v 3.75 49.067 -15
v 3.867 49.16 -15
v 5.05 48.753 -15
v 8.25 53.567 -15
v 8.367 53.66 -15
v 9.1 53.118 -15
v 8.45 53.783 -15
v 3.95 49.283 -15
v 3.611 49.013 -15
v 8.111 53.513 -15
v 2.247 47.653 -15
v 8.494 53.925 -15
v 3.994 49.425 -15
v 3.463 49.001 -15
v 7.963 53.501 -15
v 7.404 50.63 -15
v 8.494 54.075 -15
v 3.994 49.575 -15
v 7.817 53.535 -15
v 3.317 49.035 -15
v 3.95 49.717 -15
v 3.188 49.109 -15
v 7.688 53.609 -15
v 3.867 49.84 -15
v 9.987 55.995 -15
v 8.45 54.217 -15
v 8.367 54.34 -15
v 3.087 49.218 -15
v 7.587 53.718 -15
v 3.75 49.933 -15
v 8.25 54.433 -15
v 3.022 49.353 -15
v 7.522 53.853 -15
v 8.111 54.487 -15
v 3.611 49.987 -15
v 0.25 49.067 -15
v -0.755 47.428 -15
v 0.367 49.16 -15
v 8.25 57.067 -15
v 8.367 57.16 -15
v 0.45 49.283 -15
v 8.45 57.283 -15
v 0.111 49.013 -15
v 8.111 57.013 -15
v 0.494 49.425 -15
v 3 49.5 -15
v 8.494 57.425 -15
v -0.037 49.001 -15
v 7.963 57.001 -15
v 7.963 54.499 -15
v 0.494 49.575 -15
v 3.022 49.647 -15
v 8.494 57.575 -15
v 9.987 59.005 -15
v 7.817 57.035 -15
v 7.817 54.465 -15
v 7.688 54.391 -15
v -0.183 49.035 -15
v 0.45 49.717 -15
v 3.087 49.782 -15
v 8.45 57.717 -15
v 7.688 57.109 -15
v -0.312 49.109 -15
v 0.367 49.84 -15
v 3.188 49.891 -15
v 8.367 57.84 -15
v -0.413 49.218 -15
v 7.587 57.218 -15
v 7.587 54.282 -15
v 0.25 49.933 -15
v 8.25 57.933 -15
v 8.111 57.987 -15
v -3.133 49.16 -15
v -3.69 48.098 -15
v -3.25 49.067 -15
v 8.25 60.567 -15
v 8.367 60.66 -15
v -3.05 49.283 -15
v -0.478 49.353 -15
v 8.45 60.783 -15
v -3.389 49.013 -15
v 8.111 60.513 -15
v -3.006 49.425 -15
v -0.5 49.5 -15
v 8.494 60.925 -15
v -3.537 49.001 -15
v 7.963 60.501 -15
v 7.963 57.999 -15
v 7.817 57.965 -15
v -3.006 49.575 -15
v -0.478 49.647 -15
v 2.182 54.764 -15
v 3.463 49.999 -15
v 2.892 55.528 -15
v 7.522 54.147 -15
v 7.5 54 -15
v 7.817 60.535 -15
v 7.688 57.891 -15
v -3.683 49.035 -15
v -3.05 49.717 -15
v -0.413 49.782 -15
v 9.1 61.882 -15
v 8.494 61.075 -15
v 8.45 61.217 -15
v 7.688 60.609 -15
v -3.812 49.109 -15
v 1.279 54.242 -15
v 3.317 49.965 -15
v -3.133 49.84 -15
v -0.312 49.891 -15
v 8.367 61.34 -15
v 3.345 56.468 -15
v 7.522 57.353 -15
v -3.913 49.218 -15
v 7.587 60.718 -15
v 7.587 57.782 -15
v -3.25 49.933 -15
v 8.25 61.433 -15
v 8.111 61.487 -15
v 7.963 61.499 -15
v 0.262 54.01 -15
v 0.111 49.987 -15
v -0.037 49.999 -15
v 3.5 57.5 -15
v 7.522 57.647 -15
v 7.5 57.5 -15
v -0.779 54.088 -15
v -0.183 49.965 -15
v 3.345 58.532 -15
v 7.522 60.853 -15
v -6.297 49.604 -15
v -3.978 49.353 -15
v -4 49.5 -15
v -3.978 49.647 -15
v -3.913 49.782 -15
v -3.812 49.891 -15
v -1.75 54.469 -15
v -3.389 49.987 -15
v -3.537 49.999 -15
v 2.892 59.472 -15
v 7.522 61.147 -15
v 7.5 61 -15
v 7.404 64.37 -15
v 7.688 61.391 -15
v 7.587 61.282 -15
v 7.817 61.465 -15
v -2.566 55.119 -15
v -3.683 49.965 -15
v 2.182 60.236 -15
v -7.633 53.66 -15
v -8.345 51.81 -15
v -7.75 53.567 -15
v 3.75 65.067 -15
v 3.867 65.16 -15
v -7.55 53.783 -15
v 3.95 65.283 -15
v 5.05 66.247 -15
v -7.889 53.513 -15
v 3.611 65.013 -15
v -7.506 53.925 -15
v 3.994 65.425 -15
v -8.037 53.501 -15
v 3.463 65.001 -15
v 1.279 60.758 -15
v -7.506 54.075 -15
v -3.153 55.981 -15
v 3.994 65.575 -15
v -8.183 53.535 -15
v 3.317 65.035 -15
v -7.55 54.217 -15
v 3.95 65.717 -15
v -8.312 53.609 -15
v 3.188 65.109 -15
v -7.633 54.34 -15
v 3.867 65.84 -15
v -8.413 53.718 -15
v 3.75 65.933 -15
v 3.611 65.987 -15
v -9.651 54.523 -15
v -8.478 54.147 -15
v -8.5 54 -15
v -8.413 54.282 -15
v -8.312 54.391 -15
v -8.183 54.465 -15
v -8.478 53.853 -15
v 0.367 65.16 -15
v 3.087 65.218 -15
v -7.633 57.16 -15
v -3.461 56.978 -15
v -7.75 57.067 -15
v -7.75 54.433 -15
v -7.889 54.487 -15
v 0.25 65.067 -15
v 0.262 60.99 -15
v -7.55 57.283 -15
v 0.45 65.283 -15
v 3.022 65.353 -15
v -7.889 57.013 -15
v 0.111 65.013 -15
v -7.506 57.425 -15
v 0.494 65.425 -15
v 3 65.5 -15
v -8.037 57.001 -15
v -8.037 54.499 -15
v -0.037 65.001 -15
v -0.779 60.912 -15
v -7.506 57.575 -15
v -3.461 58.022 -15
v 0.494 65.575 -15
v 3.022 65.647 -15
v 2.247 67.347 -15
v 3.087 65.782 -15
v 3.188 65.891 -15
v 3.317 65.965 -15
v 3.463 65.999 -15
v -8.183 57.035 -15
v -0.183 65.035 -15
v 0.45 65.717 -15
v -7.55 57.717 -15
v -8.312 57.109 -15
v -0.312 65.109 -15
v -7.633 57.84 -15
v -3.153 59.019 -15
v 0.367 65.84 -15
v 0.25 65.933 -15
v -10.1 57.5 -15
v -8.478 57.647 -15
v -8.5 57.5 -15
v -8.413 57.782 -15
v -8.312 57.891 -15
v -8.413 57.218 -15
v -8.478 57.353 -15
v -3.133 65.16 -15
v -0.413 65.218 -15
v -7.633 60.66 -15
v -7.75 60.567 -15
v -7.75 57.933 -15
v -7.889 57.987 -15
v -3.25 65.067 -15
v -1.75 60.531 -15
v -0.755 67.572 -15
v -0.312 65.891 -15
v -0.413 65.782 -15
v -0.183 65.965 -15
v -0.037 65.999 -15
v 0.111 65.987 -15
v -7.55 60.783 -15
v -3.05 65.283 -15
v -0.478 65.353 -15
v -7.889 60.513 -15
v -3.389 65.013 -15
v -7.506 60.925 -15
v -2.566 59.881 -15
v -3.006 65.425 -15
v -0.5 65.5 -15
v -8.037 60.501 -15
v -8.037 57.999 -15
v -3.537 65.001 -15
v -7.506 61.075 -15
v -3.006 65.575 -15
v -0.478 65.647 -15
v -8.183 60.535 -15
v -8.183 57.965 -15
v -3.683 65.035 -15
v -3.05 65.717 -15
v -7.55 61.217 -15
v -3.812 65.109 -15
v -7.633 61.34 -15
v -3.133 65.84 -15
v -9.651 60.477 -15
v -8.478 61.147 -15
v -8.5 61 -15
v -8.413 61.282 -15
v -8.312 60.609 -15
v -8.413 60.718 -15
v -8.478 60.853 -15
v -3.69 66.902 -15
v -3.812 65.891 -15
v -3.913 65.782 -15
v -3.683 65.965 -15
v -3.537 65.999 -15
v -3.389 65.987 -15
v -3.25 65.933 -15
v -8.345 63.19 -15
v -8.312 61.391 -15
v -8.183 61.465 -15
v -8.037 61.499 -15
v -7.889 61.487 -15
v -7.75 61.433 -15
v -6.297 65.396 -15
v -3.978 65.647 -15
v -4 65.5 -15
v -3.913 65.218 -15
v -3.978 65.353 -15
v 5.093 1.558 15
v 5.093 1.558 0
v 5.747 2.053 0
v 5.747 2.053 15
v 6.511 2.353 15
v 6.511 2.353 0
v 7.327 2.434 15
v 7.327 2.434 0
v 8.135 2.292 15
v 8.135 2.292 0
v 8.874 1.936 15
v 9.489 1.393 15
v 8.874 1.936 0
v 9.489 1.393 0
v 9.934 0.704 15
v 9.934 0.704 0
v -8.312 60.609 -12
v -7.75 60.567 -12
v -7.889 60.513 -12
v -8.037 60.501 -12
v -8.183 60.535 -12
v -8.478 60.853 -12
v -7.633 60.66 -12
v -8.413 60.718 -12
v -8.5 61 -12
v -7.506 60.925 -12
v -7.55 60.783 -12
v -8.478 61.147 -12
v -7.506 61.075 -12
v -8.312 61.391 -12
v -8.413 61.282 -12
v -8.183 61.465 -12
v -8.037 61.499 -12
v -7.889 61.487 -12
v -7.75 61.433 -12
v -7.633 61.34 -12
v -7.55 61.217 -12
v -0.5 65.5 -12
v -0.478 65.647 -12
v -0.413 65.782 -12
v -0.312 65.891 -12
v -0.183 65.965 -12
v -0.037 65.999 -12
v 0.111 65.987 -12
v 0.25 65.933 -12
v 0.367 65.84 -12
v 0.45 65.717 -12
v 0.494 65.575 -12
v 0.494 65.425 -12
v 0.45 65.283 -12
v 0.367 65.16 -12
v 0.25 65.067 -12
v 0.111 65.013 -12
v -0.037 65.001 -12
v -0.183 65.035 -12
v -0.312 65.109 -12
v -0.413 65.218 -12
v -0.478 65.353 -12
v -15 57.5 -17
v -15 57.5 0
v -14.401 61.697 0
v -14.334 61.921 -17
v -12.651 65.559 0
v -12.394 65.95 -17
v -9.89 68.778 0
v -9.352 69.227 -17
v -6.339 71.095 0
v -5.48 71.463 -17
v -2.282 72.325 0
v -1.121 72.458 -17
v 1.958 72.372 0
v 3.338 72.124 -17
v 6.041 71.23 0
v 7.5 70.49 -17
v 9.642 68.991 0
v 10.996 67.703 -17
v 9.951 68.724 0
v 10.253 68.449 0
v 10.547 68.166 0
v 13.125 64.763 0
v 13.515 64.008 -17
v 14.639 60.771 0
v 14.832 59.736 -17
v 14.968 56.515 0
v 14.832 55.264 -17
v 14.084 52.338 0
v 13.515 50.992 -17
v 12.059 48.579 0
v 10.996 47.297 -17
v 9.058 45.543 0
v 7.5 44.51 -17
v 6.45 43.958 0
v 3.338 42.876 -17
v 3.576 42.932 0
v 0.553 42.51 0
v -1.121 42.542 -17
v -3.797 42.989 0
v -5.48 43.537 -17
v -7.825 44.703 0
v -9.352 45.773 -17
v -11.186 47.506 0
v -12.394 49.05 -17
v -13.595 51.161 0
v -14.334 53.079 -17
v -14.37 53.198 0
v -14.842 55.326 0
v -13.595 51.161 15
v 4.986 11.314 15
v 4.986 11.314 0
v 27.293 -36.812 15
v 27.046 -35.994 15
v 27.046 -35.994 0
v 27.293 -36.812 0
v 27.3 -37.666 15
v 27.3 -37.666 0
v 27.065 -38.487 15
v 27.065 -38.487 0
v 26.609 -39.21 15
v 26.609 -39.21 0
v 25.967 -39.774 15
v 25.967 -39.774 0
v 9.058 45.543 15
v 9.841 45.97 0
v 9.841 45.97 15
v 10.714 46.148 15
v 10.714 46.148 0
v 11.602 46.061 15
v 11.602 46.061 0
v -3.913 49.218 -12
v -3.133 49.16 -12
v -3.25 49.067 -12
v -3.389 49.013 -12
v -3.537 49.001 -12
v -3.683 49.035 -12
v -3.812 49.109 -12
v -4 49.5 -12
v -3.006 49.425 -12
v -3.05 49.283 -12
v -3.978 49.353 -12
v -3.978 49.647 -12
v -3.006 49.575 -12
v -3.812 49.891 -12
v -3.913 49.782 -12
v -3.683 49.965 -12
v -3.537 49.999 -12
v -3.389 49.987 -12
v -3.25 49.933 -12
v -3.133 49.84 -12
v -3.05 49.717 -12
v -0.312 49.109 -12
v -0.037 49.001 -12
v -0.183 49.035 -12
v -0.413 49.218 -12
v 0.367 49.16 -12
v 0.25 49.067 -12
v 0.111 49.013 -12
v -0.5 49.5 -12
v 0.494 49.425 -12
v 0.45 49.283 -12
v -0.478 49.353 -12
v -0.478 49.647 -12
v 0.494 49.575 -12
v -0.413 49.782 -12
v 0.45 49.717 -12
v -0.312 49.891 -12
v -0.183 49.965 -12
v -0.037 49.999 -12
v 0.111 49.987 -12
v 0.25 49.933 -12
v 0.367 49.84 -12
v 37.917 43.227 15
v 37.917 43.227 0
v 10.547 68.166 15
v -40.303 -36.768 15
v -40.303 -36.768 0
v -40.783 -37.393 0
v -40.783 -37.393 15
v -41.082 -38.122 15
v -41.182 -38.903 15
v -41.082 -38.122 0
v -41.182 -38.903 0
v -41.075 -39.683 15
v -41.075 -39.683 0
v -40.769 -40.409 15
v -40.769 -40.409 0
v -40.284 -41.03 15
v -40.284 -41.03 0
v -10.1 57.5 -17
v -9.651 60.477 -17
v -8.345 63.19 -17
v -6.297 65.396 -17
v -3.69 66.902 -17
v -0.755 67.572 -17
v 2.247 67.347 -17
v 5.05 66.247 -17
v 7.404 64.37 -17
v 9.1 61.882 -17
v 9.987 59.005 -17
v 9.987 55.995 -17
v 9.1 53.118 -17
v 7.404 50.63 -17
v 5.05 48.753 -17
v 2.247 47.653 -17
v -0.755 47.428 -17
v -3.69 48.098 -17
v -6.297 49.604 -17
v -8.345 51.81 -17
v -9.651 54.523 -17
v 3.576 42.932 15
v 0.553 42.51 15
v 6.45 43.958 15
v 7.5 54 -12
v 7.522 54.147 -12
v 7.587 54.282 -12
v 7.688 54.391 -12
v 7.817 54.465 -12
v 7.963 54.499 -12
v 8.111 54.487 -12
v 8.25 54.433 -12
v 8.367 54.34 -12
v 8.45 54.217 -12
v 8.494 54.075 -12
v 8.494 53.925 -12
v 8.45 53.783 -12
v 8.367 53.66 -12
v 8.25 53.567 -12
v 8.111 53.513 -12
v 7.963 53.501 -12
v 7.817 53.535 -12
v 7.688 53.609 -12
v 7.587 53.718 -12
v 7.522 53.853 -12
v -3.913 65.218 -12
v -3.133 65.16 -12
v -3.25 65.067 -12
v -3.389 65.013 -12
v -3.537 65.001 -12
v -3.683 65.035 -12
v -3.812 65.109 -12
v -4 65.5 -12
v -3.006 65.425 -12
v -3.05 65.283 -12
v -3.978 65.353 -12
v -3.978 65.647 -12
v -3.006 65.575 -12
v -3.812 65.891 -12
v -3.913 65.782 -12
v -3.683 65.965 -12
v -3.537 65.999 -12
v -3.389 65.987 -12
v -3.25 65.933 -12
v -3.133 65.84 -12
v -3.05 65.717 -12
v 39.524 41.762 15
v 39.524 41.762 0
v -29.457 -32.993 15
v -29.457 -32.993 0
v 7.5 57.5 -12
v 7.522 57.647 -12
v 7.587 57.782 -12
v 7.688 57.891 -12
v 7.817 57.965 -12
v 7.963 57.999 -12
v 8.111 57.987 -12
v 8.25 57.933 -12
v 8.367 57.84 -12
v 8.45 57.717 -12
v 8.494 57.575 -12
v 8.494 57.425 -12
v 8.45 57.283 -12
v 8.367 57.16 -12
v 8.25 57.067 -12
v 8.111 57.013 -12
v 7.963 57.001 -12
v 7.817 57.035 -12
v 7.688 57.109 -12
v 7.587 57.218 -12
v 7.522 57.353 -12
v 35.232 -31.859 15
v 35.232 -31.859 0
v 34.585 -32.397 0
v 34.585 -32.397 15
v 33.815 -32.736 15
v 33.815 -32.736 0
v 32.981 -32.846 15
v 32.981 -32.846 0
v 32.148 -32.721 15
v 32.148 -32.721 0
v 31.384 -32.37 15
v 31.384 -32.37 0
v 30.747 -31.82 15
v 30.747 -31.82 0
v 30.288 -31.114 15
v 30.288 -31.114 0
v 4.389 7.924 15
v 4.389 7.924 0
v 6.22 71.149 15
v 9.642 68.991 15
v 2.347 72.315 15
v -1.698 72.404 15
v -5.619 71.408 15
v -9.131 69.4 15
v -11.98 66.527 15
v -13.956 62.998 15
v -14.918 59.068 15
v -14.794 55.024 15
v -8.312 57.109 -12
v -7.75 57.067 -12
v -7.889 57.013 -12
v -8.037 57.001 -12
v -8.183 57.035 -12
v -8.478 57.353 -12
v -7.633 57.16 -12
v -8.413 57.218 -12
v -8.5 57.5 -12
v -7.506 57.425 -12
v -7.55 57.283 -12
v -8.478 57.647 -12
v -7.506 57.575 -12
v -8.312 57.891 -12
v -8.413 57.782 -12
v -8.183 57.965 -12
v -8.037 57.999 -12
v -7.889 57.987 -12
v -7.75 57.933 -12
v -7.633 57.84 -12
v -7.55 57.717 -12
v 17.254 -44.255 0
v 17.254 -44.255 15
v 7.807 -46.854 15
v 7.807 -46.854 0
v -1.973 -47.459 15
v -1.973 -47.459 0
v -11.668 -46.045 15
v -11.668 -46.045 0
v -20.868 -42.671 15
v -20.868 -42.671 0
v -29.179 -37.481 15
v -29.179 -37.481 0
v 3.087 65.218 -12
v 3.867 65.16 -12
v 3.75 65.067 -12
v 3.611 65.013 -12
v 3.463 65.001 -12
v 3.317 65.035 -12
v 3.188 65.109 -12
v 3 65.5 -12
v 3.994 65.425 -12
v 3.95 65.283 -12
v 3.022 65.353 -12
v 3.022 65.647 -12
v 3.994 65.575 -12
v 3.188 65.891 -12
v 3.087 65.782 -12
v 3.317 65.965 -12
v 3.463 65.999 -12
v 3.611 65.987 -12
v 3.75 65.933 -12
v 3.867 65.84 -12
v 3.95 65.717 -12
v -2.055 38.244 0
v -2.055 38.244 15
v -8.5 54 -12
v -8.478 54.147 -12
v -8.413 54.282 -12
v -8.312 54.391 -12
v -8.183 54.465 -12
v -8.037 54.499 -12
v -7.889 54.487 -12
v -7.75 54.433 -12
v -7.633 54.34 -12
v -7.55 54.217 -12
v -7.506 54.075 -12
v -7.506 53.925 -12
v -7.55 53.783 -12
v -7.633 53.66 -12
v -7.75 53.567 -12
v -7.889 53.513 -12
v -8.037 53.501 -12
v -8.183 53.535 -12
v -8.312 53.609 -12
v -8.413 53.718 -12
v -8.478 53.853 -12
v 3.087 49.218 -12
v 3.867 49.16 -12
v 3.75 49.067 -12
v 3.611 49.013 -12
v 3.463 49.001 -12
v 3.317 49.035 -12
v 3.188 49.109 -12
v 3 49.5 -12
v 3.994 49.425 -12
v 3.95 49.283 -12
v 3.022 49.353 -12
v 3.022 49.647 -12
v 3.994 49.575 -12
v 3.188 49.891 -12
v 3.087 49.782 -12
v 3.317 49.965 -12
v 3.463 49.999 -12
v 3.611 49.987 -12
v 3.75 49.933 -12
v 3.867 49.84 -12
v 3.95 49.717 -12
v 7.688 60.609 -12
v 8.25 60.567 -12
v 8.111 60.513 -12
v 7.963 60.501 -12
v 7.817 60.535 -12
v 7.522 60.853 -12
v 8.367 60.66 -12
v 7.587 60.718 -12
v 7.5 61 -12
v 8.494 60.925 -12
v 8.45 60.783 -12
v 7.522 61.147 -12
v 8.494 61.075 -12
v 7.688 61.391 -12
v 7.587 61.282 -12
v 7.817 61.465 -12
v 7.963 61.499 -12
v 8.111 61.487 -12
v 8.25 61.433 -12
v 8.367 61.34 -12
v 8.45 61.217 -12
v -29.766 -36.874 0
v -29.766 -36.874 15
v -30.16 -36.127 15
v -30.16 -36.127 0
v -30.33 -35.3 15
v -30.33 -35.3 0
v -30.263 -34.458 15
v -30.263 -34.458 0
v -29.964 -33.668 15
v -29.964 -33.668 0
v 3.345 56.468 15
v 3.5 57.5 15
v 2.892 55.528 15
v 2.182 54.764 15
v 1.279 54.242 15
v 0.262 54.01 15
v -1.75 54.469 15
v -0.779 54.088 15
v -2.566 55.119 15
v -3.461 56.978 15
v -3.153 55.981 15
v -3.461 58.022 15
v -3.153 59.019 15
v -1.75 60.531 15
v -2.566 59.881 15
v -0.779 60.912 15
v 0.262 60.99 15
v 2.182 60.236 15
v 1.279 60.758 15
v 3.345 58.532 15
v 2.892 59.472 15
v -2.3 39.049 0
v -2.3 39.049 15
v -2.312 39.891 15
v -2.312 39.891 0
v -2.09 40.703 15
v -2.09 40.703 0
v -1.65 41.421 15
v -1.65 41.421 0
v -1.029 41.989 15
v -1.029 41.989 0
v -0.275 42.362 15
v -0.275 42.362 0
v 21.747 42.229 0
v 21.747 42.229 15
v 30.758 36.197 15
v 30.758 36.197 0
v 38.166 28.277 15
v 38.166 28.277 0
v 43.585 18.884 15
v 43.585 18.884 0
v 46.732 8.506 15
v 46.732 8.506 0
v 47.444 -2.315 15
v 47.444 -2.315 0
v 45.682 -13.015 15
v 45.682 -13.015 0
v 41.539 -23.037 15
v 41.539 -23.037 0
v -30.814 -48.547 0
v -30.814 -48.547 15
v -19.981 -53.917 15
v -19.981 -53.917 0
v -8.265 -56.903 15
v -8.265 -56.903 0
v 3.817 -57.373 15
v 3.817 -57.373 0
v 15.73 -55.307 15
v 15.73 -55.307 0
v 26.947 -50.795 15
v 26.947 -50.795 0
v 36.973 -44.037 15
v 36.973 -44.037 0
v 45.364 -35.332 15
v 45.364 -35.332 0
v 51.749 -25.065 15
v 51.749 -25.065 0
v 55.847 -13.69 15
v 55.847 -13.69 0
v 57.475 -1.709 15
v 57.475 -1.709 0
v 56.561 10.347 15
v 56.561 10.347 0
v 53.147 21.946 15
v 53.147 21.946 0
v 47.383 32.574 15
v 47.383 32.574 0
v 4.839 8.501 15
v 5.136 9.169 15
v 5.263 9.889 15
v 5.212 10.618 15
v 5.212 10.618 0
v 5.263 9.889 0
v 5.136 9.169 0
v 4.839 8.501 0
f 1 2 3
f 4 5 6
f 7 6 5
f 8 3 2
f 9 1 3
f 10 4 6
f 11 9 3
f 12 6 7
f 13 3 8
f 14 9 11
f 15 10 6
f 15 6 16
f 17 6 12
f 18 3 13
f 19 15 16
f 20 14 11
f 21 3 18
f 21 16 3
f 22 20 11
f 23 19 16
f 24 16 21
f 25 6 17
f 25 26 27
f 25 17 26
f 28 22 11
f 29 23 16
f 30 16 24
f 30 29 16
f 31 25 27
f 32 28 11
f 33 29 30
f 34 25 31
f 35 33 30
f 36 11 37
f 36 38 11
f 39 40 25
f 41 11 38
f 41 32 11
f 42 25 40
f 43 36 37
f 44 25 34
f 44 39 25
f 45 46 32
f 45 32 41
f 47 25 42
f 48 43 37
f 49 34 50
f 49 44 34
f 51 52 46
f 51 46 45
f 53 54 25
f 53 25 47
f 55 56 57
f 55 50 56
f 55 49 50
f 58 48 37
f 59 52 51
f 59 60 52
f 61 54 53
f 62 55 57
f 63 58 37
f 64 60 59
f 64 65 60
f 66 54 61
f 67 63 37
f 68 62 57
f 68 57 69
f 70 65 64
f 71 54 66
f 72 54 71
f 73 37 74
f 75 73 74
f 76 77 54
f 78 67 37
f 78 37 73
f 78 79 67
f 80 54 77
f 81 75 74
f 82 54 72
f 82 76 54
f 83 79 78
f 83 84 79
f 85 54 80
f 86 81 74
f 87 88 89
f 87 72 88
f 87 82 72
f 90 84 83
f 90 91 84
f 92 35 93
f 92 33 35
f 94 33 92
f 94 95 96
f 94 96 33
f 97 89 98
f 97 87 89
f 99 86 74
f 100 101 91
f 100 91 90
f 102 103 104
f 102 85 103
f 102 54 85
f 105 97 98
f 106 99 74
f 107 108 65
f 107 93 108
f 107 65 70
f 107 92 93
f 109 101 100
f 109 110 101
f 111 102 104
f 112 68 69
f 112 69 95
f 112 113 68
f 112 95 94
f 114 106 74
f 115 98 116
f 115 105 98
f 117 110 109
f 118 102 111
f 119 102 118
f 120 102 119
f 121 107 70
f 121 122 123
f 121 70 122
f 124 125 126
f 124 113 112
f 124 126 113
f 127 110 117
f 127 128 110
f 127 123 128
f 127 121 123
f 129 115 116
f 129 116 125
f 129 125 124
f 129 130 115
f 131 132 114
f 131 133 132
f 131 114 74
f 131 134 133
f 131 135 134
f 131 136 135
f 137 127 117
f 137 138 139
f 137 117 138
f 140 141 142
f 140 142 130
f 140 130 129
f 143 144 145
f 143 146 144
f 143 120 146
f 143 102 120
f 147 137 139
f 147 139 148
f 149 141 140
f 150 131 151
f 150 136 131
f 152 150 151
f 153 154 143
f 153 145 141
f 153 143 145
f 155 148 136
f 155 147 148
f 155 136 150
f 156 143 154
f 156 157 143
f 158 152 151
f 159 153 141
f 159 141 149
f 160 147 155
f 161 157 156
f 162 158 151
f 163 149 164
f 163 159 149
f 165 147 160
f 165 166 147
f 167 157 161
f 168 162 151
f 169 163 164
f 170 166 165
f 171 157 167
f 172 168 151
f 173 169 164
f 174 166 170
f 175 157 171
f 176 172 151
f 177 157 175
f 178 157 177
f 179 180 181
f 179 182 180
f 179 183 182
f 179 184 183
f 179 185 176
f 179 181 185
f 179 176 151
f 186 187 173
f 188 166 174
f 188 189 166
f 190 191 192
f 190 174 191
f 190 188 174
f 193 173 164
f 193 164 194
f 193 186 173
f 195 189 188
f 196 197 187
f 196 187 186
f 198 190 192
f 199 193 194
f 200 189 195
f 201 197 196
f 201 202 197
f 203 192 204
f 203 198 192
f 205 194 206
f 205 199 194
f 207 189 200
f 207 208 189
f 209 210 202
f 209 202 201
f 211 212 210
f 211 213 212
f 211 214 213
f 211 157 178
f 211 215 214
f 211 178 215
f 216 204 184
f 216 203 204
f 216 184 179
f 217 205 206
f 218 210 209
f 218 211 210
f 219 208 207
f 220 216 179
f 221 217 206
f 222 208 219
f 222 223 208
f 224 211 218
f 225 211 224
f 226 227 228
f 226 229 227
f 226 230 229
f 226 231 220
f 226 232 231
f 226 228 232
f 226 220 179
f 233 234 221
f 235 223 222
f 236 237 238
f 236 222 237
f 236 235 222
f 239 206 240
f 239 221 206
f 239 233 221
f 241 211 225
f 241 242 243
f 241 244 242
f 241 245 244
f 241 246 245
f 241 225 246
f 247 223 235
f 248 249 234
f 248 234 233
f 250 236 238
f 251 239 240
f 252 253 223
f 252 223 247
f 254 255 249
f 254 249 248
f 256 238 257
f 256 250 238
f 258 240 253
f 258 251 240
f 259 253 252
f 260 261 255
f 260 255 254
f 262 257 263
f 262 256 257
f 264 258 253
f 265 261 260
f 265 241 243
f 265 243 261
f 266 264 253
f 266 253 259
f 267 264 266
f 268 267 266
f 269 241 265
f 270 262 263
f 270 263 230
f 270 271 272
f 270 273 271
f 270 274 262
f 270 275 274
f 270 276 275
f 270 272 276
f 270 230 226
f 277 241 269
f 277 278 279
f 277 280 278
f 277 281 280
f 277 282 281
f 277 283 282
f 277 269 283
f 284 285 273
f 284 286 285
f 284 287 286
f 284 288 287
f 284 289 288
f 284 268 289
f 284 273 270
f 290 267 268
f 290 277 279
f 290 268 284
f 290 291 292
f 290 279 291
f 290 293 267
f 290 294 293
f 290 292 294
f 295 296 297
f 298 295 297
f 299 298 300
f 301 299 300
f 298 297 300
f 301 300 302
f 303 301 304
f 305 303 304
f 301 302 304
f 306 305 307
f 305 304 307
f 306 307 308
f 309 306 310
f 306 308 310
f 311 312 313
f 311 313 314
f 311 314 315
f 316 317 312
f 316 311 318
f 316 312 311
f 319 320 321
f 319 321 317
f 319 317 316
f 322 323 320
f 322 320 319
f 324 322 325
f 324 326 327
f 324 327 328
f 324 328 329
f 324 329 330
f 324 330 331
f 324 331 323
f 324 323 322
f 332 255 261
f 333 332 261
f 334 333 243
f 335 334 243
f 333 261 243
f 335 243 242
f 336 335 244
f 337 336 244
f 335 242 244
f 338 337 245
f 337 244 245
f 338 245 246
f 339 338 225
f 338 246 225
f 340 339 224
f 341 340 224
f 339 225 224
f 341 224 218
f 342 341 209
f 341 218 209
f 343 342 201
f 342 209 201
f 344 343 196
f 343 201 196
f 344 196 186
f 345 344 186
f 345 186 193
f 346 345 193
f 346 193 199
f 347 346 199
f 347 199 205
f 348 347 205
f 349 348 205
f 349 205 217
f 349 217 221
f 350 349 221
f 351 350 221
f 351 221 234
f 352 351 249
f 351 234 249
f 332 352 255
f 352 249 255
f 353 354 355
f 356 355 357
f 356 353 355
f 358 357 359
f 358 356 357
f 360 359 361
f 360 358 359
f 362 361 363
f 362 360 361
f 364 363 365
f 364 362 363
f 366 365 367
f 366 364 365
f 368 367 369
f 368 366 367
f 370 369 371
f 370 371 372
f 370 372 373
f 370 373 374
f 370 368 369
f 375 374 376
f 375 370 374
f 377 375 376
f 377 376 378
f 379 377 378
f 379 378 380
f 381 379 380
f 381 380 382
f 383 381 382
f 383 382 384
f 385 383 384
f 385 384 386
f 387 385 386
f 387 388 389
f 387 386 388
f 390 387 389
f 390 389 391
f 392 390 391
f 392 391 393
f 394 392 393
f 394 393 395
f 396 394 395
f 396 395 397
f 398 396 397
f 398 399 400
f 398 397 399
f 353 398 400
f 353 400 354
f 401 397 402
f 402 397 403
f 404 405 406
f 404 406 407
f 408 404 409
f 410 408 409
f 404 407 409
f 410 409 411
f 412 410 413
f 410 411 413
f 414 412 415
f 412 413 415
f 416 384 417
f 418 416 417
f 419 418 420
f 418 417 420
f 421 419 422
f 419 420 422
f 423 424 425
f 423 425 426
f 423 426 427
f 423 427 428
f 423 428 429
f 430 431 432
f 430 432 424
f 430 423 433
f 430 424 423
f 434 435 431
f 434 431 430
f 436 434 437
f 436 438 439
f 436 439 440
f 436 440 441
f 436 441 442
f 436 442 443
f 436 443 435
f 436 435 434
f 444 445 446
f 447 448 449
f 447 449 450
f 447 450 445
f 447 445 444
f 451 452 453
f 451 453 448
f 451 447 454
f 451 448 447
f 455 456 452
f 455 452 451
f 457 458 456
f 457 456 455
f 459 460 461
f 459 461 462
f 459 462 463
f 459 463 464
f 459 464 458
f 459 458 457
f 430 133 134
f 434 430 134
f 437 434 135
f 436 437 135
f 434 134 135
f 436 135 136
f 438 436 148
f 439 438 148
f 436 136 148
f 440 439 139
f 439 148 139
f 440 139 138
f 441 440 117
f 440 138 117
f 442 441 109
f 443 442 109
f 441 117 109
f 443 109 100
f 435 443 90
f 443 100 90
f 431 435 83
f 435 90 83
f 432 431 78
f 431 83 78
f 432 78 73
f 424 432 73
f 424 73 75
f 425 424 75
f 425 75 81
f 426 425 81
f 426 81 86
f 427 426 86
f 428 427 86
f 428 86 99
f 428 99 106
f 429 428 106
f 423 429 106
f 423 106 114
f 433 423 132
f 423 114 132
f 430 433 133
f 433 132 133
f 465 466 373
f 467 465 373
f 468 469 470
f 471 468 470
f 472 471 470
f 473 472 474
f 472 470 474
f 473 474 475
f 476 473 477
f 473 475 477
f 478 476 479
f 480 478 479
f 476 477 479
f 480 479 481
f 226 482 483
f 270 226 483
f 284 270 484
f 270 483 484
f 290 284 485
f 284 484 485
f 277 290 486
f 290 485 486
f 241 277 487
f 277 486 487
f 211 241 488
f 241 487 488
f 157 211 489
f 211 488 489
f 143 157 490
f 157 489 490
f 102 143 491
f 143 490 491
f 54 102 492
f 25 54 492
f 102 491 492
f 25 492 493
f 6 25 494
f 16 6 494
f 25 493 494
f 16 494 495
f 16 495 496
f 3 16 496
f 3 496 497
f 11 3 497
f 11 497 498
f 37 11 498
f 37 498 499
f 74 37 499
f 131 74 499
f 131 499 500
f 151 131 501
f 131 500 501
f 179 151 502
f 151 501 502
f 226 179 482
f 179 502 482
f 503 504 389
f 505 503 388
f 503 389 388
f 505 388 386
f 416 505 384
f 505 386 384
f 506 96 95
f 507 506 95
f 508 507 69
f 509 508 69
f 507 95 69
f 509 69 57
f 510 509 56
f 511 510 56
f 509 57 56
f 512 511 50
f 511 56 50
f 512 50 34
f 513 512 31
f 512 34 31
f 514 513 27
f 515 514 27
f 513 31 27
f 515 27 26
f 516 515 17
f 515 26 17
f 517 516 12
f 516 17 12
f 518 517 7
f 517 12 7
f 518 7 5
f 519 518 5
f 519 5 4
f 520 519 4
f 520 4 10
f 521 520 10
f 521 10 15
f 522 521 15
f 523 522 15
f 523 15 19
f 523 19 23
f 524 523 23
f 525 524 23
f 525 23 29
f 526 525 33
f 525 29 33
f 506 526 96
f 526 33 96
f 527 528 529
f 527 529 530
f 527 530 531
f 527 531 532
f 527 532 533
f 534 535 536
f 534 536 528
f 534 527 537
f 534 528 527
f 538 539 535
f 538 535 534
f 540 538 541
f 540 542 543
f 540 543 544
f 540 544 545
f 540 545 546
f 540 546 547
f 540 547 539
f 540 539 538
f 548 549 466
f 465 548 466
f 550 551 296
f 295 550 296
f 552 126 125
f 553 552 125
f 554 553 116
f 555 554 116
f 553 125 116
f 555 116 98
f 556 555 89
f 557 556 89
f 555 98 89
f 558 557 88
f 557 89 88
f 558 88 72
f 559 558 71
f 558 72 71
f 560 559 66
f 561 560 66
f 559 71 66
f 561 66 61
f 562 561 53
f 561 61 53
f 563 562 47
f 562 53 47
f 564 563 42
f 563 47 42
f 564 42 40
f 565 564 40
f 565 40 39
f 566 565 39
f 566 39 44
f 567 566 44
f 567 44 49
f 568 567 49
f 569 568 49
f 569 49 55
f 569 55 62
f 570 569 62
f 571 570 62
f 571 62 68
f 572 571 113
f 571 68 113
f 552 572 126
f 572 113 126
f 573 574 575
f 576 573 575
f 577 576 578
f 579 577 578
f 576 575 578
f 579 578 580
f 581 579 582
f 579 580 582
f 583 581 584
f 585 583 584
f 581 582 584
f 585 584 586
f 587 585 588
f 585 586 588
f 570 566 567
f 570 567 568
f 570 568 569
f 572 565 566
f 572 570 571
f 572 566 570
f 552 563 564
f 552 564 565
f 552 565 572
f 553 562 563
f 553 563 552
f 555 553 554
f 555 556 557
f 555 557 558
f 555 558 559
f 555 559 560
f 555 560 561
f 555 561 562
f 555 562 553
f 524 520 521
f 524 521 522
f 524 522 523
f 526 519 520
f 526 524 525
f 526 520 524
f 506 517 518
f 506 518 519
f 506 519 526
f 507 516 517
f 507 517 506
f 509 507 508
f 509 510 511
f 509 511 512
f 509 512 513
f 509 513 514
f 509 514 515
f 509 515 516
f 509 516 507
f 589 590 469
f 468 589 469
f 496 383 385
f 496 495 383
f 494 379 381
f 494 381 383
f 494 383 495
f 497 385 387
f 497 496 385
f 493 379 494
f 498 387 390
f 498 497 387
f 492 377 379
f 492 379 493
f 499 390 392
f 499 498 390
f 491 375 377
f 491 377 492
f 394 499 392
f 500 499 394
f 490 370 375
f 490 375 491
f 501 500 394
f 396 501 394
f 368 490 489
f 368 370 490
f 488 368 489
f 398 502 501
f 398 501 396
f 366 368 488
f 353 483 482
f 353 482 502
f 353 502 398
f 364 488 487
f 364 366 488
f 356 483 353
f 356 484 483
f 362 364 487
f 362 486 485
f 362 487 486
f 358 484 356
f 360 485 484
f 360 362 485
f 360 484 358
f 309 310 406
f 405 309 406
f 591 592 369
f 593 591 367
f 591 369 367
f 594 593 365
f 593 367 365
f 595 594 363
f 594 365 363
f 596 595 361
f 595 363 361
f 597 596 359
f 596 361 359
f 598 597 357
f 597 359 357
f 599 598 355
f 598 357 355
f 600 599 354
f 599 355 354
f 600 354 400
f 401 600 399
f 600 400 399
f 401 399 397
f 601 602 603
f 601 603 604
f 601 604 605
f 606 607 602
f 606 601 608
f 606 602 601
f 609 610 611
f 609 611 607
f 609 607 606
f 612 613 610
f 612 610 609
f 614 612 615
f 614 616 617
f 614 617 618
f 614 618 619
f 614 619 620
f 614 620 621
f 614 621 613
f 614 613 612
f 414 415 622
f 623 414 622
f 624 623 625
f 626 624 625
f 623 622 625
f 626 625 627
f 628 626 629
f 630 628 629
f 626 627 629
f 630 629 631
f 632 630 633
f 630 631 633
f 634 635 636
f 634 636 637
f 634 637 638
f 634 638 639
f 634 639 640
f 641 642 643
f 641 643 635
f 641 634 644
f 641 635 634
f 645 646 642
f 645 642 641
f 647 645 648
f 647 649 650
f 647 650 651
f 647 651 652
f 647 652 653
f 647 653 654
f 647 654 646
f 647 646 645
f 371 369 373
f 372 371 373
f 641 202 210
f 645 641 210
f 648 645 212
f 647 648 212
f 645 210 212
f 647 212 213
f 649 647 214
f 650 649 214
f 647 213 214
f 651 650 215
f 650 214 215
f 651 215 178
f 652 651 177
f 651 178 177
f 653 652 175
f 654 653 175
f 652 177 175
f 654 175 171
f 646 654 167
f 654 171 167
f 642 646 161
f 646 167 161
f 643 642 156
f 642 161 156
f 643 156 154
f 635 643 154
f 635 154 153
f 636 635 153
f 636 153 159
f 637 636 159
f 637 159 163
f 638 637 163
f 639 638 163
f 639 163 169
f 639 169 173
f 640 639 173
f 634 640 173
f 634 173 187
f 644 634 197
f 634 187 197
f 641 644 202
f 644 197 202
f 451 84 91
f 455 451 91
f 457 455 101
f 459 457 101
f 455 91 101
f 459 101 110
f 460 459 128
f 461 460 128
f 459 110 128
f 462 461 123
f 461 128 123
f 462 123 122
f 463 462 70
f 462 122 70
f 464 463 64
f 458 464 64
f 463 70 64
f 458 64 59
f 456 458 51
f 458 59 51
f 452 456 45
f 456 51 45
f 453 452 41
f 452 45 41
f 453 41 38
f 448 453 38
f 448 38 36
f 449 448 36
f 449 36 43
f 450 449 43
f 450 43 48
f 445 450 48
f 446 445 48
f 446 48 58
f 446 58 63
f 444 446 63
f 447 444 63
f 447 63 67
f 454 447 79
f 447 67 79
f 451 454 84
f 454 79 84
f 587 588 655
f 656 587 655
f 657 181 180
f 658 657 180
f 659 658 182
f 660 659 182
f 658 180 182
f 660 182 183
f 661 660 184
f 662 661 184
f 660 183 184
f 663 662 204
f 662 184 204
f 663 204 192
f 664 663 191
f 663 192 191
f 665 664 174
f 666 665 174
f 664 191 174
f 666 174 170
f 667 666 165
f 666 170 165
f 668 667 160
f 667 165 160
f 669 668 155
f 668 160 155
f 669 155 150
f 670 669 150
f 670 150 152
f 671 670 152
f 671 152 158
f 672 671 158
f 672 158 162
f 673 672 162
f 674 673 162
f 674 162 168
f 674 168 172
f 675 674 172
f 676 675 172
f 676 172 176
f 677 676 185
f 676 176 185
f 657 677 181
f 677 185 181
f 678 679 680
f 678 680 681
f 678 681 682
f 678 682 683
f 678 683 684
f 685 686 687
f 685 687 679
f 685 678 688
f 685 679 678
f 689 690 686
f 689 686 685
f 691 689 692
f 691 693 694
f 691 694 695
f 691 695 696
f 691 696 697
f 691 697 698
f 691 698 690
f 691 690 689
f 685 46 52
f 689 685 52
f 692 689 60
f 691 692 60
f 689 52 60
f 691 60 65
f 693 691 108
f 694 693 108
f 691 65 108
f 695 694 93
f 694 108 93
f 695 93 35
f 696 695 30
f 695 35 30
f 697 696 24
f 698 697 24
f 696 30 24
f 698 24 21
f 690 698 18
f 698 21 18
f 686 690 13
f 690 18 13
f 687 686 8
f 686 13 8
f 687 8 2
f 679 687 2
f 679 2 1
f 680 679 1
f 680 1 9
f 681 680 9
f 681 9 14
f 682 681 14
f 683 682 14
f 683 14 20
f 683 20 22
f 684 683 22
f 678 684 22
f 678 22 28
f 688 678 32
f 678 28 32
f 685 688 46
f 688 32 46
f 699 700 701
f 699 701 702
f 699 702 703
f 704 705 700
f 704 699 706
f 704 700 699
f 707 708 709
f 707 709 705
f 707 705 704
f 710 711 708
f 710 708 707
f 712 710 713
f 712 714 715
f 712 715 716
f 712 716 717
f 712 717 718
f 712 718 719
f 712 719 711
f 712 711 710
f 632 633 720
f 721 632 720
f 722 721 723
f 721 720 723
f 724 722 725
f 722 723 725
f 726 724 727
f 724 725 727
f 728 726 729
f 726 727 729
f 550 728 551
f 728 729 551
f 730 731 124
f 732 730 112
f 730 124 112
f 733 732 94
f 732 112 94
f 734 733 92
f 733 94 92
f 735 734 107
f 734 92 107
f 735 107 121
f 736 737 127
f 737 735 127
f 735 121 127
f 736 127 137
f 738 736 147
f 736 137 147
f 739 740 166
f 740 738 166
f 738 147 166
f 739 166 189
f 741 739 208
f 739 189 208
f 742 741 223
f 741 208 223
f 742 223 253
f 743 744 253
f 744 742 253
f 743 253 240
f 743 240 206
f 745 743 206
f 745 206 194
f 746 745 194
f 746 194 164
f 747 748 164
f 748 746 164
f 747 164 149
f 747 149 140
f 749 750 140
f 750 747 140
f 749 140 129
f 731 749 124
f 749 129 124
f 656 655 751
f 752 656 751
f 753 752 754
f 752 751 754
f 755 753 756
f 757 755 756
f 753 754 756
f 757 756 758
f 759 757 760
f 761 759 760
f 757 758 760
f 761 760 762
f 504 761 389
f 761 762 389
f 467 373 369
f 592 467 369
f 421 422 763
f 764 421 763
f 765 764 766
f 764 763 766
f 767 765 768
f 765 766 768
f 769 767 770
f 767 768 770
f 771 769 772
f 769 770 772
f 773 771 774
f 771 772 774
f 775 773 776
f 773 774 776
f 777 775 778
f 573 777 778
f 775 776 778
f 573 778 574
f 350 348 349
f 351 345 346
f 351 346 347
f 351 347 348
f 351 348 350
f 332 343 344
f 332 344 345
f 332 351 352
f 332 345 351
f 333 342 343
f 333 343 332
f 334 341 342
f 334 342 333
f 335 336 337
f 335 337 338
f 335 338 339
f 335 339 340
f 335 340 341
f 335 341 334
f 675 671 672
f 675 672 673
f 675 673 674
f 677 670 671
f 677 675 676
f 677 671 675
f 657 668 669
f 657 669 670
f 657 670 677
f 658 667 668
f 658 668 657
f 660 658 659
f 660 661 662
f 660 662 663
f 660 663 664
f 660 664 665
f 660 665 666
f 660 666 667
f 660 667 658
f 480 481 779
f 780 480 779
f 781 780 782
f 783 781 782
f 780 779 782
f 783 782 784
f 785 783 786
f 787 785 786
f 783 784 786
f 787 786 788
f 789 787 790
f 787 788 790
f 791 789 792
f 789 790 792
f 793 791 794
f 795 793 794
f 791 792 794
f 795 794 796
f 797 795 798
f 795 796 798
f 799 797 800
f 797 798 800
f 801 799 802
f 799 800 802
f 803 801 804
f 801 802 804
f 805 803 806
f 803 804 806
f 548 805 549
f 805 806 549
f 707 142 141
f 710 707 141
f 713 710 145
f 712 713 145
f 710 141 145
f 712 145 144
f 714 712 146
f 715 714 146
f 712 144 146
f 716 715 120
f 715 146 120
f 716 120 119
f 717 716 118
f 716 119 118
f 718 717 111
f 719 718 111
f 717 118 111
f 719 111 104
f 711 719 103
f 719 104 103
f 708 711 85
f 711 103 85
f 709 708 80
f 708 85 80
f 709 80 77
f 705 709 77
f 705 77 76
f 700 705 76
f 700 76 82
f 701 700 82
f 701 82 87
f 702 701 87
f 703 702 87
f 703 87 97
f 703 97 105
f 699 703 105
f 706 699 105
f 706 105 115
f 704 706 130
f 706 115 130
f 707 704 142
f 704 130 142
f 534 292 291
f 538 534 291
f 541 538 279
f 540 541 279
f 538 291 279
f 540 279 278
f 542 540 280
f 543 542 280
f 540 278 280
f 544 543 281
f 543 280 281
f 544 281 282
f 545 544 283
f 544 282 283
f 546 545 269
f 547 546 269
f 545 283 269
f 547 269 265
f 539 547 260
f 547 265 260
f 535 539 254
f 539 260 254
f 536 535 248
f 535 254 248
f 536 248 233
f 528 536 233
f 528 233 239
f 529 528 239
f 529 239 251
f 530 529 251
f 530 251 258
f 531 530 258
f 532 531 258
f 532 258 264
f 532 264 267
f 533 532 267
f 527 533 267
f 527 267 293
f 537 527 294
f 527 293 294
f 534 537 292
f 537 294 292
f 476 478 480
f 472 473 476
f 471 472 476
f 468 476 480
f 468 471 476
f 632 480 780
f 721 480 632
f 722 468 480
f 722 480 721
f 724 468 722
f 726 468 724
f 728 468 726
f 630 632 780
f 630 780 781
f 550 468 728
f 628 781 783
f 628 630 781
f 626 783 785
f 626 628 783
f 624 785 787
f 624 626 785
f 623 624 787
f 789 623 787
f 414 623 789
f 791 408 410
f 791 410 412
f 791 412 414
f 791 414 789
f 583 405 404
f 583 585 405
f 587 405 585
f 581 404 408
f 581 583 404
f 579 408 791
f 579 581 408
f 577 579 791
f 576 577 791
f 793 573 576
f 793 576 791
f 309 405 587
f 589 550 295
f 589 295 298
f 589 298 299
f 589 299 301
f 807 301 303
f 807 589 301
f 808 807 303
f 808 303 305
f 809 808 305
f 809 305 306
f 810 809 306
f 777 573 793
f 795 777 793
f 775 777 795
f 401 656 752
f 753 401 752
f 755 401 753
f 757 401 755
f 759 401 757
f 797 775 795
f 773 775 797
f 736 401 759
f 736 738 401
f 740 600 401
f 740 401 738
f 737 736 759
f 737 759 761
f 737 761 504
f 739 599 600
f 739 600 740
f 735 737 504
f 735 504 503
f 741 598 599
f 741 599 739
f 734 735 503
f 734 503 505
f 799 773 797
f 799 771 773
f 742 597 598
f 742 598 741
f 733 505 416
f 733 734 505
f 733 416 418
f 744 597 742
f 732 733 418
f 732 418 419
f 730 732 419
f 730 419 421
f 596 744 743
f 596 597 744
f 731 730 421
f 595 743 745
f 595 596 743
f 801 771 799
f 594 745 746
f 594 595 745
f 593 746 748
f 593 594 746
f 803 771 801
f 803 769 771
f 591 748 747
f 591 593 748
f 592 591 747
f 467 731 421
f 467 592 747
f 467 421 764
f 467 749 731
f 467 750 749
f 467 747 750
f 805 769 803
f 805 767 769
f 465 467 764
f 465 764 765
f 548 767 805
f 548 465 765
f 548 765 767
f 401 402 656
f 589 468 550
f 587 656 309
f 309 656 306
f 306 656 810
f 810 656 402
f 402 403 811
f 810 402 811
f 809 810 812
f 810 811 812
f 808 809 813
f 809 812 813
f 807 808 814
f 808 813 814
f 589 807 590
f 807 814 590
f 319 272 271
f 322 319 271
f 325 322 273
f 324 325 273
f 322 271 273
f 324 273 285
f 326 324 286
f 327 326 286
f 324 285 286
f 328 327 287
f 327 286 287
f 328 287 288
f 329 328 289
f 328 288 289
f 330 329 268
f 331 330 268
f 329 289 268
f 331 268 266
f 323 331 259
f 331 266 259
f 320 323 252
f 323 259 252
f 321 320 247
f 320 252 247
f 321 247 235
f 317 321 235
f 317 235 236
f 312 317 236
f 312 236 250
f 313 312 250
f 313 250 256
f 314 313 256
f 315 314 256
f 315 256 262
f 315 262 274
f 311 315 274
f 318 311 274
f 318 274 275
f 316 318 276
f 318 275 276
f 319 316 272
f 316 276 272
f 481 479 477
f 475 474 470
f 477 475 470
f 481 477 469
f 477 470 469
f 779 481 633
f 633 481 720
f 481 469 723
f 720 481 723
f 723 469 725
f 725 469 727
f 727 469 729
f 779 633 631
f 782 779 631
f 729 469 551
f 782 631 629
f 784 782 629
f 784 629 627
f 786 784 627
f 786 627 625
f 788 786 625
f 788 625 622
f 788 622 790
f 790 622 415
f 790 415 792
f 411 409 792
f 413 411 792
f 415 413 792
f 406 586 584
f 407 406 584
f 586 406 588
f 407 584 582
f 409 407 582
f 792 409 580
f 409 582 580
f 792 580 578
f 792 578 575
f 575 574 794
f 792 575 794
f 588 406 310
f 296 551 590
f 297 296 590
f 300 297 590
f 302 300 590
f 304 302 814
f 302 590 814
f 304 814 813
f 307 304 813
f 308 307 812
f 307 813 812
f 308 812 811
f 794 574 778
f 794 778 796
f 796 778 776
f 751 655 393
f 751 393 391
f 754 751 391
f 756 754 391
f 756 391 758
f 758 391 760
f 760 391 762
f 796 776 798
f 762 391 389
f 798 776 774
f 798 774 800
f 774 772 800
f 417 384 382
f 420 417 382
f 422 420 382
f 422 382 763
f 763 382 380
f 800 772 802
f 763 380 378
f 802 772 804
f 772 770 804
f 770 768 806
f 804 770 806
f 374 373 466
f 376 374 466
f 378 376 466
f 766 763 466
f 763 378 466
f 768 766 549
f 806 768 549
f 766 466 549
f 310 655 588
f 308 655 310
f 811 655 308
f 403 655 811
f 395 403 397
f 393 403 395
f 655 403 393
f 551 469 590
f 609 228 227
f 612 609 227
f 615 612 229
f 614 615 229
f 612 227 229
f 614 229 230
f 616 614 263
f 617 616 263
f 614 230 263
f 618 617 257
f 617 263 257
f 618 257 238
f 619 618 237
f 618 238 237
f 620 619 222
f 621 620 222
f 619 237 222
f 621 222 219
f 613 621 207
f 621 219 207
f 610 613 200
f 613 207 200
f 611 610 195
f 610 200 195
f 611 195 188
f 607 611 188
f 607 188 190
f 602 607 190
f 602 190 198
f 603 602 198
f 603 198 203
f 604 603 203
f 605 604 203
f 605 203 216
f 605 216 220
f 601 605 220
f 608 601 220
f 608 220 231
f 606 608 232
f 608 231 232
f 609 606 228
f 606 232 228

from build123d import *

# Parameters (mm, degrees)
EXTRUDE_1_DEPTH     = 15
SKETCH_6_R          = 3.5
CUT_EXTRUDE_2_DEPTH = 15
EXTRUDE_START       = 17
SKETCH_11_R         = 15
SKETCH_11_R_2       = 3.5
EXTRUDE_3_DEPTH     = 17
SKETCH_12_R         = 10.1
CUT_EXTRUDE_6_DEPTH = 2
SKETCH_13_R         = 0.5
CUT_EXTRUDE_7_DEPTH = 3


with BuildPart() as part:
    # ｽｹｯﾁ1 → ﾎﾞｽ - 押し出し1 (new body)
    with BuildSketch(Plane.XY):
        with BuildLine():
            Line((10.546944731, 68.165925034), (9.641814145, 68.990666647))
            ThreePointArc((9.641814145, 68.990666647), (-9.131421435, 69.400300104), (-13.594616806, 51.160726074))
            Line((-13.594616806, 51.160726074), (4.986432096, 11.313538113))
            ThreePointArc((4.986432096, 11.313538113), (5.221931994, 9.524738795), (4.388829079, 7.924362985))
            Line((4.388829079, 7.924362985), (-40.303464689, -36.767930783))
            ThreePointArc((-40.303464689, -36.767930783), (-41.182112782, -38.903012739), (-40.283913759, -41.029943849))
            ThreePointArc((-40.283913759, -41.029943849), (41.397896806, -39.905690573), (39.524106652, 41.762363359))
            Line((39.524106652, 41.762363359), (37.916838192, 43.226882625))
            Line((37.916838192, 43.226882625), (10.546944731, 68.165925034))
        make_face()
        with BuildLine():
            ThreePointArc((5.093338956, 1.55780505), (7.735603832, 2.390907965), (9.933582661, 0.704339492))
            Line((9.933582661, 0.704339492), (27.046217634, -35.993824637))
            ThreePointArc((27.046217634, -35.993824637), (27.212084573, -38.085077821), (25.967336583, -39.773702754))
            ThreePointArc((25.967336583, -39.773702754), (-1.972837213, -47.459012983), (-29.17877254, -37.481318454))
            ThreePointArc((-29.17877254, -37.481318454), (-30.330146685, -35.299826939), (-29.457223039, -32.992756945))
            Line((-29.457223039, -32.992756945), (5.093338956, 1.55780505))
        make_face(mode=Mode.SUBTRACT)
        with BuildLine():
            ThreePointArc((35.231836325, -31.858557864), (32.560090836, -32.813013733), (30.287744354, -31.114293205))
            Line((30.287744354, -31.114293205), (-2.054746852, 38.244403012))
            ThreePointArc((-2.054746852, 38.244403012), (-1.895310582, 41.077194163), (0.553480425, 42.510214831))
            ThreePointArc((0.553480425, 42.510214831), (5.039223996, 43.371793408), (9.057681155, 45.543478261))
            ThreePointArc((9.057681155, 45.543478261), (10.270904088, 46.091905397), (11.601973614, 46.061309233))
            ThreePointArc((11.601973614, 46.061309233), (45.455779175, 13.784851815), (35.231836325, -31.858557864))
        make_face(mode=Mode.SUBTRACT)
    extrude(amount=EXTRUDE_1_DEPTH)

    # ｽｹｯﾁ6 → ｶｯﾄ - 押し出し2 (cut)
    with BuildSketch(Plane.XY.offset(15)):
        with Locations((0, 57.5)):
            Circle(SKETCH_6_R)
    extrude(amount=-CUT_EXTRUDE_2_DEPTH, mode=Mode.SUBTRACT)

    # ｽｹｯﾁ11 → ﾎﾞｽ - 押し出し3 (add)
    with BuildSketch(Plane(origin=(0, 0, 0), x_dir=(-1, 0, 0), z_dir=(0, 0, -1)).offset(EXTRUDE_START)):
        with Locations((0, 57.5)):
            Circle(SKETCH_11_R)
        with Locations(Location((0, 57.5, 0), (0, 0, 180))):
            Circle(SKETCH_11_R_2, mode=Mode.SUBTRACT)
    extrude(amount=-EXTRUDE_3_DEPTH)

    # ｽｹｯﾁ12 → ｶｯﾄ - 押し出し6 (cut)
    with BuildSketch(Plane(origin=(0, 0, -17), x_dir=(-1, 0, 0), z_dir=(0, 0, -1))):
        with Locations((0, 57.5)):
            Circle(SKETCH_12_R)
    extrude(amount=-CUT_EXTRUDE_6_DEPTH, mode=Mode.SUBTRACT)

    # ｽｹｯﾁ13 → ｶｯﾄ - 押し出し7 (cut)
    with BuildSketch(Plane(origin=(0, 0, -15), x_dir=(-1, 0, 0), z_dir=(0, 0, -1))):
        with Locations((-3.5, 65.5)):
            Circle(SKETCH_13_R)
        with Locations((0, 65.5)):
            Circle(SKETCH_13_R)
        with Locations((3.5, 65.5)):
            Circle(SKETCH_13_R)
        with Locations((8, 57.5)):
            Circle(SKETCH_13_R)
        with Locations((8, 61)):
            Circle(SKETCH_13_R)
        with Locations((8, 54)):
            Circle(SKETCH_13_R)
        with Locations((0, 49.5)):
            Circle(SKETCH_13_R)
        with Locations((3.5, 49.5)):
            Circle(SKETCH_13_R)
        with Locations((-3.5, 49.5)):
            Circle(SKETCH_13_R)
        with Locations((-8, 57.5)):
            Circle(SKETCH_13_R)
        with Locations((-8, 54)):
            Circle(SKETCH_13_R)
        with Locations((-8, 61)):
            Circle(SKETCH_13_R)
    extrude(amount=-CUT_EXTRUDE_7_DEPTH, mode=Mode.SUBTRACT)


solid = part.part
